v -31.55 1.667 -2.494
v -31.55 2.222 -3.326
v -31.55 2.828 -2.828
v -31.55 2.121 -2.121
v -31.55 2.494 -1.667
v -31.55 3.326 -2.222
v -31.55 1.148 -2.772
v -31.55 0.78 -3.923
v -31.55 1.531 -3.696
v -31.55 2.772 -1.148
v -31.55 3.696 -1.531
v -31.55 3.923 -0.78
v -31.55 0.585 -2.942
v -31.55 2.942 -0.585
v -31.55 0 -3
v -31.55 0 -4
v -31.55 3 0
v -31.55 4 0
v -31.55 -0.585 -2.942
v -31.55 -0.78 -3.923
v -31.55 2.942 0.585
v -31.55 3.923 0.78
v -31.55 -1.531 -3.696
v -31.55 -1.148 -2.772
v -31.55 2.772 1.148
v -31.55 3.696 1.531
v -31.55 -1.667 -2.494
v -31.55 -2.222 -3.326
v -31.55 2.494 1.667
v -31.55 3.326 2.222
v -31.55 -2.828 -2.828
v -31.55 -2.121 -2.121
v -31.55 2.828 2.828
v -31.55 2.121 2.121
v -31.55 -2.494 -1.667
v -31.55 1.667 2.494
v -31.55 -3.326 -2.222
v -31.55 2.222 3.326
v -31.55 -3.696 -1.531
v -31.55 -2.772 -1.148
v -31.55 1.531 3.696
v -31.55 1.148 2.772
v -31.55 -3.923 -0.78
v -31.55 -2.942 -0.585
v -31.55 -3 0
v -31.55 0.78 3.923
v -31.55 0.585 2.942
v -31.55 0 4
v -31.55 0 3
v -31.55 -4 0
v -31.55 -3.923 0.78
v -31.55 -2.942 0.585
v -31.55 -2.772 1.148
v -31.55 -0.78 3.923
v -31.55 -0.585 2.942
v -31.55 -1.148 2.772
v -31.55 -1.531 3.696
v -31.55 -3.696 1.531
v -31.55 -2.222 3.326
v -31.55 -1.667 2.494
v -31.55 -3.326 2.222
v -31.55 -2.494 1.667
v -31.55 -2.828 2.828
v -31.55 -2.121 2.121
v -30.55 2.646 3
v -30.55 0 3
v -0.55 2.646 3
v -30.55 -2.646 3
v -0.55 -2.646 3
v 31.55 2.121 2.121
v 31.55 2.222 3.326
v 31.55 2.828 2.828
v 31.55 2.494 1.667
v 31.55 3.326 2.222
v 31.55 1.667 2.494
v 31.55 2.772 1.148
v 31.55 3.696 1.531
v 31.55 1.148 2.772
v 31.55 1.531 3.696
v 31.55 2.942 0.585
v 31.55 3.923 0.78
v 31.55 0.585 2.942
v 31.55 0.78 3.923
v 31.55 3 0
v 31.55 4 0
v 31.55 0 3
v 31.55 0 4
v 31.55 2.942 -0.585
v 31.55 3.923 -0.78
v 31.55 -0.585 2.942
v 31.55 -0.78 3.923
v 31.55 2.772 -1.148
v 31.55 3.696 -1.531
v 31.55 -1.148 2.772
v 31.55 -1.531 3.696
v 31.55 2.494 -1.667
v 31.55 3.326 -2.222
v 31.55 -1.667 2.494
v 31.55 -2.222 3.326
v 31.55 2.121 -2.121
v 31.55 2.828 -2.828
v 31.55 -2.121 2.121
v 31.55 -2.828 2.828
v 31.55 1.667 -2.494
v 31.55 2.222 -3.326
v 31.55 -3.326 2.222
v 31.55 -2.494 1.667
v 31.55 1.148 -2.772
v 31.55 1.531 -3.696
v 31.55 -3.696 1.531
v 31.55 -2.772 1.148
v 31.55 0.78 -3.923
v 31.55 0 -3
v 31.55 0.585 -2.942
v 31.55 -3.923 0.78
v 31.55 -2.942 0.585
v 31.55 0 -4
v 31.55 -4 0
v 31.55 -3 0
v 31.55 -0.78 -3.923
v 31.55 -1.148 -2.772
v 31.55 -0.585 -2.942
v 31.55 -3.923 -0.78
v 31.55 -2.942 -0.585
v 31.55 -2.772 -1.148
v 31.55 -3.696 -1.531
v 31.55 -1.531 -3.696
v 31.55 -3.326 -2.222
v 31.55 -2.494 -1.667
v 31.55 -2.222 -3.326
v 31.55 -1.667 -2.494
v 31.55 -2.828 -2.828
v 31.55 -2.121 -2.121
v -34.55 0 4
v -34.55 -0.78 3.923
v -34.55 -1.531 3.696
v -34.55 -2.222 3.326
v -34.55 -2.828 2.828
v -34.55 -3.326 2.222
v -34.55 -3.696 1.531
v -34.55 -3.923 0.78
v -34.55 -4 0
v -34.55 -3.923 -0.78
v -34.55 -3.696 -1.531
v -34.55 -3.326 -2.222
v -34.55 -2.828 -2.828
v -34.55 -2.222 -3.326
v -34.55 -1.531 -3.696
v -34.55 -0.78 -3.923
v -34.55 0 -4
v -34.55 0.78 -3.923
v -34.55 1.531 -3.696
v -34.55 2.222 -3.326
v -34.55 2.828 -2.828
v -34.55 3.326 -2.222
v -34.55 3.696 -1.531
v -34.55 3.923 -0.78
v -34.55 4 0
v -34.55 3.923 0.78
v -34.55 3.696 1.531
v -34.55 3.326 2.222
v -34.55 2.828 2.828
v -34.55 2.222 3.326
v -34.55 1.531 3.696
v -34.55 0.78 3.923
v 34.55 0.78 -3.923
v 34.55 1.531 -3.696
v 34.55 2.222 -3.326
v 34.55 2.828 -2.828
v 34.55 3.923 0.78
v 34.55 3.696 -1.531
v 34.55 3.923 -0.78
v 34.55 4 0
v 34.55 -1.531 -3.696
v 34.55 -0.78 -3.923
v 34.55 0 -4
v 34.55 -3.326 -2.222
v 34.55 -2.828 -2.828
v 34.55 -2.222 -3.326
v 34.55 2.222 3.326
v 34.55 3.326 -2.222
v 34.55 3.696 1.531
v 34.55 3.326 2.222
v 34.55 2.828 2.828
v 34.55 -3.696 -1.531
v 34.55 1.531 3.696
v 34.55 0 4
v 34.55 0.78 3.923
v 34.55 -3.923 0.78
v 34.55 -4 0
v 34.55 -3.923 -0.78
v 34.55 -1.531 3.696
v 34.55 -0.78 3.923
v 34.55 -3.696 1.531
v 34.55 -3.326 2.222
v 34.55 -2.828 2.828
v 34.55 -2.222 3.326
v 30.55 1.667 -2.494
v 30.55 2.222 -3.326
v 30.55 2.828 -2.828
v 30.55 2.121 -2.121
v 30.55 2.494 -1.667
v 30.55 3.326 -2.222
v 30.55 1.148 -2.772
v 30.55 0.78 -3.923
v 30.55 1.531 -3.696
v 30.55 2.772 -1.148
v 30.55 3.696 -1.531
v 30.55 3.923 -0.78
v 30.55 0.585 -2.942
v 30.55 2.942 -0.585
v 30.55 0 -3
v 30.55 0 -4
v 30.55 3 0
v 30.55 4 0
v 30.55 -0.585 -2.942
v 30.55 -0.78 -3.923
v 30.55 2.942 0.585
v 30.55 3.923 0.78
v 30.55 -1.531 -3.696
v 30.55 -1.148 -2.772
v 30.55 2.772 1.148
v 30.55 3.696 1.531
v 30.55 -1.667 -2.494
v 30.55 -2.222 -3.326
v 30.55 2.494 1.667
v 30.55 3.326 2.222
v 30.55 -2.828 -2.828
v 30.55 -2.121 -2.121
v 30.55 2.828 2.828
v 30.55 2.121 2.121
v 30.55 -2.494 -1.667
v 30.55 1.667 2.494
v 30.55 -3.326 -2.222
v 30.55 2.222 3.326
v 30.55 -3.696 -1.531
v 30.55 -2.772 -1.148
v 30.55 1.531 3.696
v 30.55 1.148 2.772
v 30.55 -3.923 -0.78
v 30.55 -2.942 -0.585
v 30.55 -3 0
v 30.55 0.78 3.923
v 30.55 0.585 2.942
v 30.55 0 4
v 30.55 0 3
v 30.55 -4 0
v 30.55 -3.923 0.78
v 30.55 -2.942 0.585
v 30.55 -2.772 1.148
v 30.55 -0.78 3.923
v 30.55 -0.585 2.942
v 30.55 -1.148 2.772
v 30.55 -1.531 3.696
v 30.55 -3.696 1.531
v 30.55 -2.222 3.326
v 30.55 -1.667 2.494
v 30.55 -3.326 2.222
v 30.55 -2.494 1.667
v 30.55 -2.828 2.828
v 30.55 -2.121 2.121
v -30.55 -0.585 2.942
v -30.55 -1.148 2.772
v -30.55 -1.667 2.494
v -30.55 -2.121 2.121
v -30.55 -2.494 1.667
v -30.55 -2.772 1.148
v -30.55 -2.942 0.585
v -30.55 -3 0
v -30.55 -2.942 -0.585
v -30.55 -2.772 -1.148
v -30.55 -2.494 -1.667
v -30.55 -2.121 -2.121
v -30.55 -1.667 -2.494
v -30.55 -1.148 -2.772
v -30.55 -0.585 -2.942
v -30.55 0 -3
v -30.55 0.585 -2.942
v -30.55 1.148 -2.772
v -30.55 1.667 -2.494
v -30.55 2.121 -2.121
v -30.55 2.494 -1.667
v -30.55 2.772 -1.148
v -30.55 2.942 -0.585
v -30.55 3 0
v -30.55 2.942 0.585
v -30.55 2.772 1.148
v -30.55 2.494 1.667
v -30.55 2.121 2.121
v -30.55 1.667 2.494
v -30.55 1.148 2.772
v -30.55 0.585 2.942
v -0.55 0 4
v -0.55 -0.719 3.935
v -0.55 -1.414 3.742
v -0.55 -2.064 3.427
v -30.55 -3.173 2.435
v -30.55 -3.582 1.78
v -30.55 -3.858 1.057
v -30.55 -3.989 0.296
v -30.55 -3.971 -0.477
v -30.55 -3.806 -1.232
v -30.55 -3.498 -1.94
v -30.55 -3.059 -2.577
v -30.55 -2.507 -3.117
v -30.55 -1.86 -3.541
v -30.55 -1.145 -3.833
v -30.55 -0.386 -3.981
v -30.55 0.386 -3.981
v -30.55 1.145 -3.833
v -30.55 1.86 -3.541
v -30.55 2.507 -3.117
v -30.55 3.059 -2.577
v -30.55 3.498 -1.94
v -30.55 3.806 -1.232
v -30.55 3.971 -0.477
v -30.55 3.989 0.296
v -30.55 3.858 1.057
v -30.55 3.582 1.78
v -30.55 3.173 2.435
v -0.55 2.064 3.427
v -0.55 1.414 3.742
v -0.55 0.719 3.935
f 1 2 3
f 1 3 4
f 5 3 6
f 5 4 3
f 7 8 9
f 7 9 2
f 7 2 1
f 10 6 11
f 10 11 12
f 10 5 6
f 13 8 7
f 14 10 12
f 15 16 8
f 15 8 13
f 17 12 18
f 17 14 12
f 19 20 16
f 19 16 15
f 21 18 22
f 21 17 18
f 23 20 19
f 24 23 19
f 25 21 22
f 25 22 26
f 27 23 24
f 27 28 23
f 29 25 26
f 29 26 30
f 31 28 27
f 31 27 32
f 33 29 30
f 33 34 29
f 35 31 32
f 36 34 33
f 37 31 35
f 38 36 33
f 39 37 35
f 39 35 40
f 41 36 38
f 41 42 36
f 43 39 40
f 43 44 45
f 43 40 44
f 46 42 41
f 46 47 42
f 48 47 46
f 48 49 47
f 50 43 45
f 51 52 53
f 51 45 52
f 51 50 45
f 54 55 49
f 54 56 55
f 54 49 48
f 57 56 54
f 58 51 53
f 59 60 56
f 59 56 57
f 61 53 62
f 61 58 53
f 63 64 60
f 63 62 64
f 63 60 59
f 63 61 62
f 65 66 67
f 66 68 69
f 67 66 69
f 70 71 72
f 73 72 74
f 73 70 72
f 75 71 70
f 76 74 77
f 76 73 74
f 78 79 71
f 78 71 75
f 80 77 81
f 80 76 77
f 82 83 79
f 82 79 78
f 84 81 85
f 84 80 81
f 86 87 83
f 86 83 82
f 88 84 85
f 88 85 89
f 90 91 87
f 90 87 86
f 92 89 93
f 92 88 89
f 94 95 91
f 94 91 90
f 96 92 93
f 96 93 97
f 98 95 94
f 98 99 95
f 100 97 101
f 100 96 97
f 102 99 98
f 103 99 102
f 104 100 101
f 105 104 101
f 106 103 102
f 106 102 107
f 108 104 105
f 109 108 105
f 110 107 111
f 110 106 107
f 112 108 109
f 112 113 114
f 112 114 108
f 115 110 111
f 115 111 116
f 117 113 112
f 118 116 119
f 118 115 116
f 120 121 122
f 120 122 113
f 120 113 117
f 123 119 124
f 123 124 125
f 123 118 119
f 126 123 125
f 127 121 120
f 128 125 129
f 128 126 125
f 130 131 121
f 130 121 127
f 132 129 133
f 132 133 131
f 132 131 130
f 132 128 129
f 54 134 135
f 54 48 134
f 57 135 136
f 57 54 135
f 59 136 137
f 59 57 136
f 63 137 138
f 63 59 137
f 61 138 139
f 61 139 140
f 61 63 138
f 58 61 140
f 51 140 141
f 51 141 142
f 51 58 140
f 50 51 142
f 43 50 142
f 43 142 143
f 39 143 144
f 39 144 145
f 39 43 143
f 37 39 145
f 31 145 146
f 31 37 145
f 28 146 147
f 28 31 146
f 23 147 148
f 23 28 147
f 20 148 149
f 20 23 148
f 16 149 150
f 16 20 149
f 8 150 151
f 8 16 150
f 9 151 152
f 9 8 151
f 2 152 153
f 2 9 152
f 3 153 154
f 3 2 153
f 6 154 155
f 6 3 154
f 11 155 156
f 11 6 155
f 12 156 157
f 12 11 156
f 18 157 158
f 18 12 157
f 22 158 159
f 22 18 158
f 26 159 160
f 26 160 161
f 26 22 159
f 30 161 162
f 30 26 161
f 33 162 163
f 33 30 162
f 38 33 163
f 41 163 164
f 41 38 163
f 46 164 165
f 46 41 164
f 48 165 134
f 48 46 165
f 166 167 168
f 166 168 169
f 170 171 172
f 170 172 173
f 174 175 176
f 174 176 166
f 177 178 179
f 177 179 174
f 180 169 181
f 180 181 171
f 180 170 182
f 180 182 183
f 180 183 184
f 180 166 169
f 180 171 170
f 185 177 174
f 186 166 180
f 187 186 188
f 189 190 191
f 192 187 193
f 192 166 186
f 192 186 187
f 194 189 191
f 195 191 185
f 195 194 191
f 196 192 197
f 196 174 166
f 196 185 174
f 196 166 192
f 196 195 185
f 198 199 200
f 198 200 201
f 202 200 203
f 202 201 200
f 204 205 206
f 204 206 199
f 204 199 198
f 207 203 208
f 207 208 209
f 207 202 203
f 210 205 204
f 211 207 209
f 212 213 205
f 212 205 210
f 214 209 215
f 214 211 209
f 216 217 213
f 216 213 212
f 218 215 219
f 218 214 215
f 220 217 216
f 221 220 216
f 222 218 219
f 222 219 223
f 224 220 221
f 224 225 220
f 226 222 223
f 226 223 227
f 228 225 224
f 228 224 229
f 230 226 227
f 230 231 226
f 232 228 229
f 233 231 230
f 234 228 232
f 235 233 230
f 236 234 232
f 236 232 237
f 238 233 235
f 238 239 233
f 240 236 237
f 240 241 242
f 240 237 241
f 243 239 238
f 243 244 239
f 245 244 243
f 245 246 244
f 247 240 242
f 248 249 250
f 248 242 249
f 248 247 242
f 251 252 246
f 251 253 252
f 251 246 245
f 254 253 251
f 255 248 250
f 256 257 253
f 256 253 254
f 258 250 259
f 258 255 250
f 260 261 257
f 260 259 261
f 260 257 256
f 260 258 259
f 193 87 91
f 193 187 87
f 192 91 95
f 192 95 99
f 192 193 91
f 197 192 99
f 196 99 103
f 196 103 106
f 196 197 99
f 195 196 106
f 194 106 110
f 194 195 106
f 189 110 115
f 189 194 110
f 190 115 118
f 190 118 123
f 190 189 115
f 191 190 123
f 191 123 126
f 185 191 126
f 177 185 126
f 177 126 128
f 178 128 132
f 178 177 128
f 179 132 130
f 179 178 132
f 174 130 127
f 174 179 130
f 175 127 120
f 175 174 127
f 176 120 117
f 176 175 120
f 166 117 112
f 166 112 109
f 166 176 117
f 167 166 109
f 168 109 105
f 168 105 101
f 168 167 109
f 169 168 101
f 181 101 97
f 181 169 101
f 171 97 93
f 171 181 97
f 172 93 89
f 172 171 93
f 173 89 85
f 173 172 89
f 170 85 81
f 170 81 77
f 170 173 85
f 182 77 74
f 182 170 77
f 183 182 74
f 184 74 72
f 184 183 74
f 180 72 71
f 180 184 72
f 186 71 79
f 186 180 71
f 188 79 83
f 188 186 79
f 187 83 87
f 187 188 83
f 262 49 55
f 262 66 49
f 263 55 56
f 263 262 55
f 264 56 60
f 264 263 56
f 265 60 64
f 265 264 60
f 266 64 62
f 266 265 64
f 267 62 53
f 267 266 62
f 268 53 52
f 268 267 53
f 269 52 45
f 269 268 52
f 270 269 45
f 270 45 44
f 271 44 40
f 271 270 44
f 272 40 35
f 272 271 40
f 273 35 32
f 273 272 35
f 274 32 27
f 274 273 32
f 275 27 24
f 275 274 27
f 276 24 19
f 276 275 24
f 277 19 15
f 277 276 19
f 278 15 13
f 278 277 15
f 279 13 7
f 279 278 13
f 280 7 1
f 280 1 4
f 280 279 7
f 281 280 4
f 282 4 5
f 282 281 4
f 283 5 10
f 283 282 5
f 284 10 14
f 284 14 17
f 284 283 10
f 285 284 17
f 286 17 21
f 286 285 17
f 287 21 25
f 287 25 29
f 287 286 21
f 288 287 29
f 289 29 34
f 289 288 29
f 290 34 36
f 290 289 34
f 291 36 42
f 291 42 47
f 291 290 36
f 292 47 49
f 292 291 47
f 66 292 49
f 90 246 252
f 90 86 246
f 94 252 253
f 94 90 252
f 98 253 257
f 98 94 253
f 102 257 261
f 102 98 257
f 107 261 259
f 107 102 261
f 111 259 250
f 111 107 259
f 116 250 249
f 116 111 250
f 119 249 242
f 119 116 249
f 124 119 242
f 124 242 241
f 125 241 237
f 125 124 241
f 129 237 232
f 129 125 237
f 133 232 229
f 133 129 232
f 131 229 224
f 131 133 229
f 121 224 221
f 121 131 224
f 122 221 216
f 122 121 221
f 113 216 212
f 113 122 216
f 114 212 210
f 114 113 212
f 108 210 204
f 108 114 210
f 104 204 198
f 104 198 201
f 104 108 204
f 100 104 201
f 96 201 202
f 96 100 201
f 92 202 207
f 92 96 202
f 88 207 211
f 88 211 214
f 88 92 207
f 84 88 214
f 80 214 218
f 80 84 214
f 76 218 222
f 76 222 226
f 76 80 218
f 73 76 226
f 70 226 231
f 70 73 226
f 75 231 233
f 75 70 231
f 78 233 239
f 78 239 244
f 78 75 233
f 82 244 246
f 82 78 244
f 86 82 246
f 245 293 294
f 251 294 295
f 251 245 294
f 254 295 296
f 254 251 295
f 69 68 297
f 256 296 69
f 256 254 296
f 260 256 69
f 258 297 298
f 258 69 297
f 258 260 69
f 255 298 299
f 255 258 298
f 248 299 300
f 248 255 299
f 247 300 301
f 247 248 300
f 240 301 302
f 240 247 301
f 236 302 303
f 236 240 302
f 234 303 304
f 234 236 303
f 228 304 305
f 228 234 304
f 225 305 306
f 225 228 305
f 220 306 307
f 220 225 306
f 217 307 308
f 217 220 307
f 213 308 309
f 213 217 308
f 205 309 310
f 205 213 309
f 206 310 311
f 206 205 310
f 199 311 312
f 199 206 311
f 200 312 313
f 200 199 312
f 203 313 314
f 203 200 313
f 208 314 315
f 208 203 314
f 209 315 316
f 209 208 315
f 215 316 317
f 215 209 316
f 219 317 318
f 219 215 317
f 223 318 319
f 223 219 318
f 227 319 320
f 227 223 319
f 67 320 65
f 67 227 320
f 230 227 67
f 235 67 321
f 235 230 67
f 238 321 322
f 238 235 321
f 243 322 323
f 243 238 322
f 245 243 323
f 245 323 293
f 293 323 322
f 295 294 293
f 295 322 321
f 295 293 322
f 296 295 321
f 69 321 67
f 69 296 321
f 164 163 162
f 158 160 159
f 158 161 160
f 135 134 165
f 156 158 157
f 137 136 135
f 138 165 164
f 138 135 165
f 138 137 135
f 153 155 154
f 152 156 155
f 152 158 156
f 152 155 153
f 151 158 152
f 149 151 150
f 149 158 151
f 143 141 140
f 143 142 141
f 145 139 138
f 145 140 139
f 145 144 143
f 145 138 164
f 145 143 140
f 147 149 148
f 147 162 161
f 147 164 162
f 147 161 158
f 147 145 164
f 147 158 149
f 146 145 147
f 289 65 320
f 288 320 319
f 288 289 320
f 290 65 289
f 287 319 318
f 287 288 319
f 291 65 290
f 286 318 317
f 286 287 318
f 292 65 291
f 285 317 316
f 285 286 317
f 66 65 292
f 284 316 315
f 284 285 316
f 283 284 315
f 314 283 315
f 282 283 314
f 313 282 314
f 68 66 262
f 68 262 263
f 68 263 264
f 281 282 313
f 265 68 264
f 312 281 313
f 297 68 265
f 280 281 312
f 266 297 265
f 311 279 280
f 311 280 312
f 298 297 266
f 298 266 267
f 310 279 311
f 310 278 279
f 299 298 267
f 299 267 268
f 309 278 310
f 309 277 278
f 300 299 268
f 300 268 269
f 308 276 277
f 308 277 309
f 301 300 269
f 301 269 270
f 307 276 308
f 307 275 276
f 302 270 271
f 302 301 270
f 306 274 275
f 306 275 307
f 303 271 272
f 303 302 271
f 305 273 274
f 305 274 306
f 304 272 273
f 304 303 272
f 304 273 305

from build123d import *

# Parameters (mm, degrees)
CORTAR_EXTRUIR1_DEPTH      = 36.010034276
CORTAR_EXTRUIR1_DEPTH_BACK = 36.010034276
CROQUIS2_W                 = 30
CROQUIS2_H                 = 1


with BuildPart() as part:
    # Croquis1 → Revolución1 (revolve)
    with BuildSketch(Plane(origin=(0, 0, 0), x_dir=(1, 0, 0), z_dir=(0, 1, 0)), mode=Mode.PRIVATE) as revoluci_n1_sk:
        Polygon((-34.55, 0), (-34.55, 4), (-31.55, 4), (-31.55, 3), (-30.55, 3), (-30.55, 4), (30.55, 4), (30.55, 3), (31.55, 3), (31.55, 4), (34.55, 4), (34.55, 0), align=None)
    revolve(revoluci_n1_sk.sketch.rotate(Axis((-34.55, 0, 0), (1, 0, 0)), 180), axis=Axis((-34.55, 0, 0), (1, 0, 0)))

    # Croquis2 → Cortar-Extruir1 (cut, two sides: drawn at the far end of the back side and taken through both)
    with BuildSketch(Plane(origin=(0, 0, 0), x_dir=(1, 0, 0), z_dir=(0, 1, 0)).offset(-CORTAR_EXTRUIR1_DEPTH_BACK)):
        with Locations((-15.55, -3.5)):
            Rectangle(CROQUIS2_W, CROQUIS2_H)
    extrude(amount=CORTAR_EXTRUIR1_DEPTH + CORTAR_EXTRUIR1_DEPTH_BACK, mode=Mode.SUBTRACT)


solid = part.part
